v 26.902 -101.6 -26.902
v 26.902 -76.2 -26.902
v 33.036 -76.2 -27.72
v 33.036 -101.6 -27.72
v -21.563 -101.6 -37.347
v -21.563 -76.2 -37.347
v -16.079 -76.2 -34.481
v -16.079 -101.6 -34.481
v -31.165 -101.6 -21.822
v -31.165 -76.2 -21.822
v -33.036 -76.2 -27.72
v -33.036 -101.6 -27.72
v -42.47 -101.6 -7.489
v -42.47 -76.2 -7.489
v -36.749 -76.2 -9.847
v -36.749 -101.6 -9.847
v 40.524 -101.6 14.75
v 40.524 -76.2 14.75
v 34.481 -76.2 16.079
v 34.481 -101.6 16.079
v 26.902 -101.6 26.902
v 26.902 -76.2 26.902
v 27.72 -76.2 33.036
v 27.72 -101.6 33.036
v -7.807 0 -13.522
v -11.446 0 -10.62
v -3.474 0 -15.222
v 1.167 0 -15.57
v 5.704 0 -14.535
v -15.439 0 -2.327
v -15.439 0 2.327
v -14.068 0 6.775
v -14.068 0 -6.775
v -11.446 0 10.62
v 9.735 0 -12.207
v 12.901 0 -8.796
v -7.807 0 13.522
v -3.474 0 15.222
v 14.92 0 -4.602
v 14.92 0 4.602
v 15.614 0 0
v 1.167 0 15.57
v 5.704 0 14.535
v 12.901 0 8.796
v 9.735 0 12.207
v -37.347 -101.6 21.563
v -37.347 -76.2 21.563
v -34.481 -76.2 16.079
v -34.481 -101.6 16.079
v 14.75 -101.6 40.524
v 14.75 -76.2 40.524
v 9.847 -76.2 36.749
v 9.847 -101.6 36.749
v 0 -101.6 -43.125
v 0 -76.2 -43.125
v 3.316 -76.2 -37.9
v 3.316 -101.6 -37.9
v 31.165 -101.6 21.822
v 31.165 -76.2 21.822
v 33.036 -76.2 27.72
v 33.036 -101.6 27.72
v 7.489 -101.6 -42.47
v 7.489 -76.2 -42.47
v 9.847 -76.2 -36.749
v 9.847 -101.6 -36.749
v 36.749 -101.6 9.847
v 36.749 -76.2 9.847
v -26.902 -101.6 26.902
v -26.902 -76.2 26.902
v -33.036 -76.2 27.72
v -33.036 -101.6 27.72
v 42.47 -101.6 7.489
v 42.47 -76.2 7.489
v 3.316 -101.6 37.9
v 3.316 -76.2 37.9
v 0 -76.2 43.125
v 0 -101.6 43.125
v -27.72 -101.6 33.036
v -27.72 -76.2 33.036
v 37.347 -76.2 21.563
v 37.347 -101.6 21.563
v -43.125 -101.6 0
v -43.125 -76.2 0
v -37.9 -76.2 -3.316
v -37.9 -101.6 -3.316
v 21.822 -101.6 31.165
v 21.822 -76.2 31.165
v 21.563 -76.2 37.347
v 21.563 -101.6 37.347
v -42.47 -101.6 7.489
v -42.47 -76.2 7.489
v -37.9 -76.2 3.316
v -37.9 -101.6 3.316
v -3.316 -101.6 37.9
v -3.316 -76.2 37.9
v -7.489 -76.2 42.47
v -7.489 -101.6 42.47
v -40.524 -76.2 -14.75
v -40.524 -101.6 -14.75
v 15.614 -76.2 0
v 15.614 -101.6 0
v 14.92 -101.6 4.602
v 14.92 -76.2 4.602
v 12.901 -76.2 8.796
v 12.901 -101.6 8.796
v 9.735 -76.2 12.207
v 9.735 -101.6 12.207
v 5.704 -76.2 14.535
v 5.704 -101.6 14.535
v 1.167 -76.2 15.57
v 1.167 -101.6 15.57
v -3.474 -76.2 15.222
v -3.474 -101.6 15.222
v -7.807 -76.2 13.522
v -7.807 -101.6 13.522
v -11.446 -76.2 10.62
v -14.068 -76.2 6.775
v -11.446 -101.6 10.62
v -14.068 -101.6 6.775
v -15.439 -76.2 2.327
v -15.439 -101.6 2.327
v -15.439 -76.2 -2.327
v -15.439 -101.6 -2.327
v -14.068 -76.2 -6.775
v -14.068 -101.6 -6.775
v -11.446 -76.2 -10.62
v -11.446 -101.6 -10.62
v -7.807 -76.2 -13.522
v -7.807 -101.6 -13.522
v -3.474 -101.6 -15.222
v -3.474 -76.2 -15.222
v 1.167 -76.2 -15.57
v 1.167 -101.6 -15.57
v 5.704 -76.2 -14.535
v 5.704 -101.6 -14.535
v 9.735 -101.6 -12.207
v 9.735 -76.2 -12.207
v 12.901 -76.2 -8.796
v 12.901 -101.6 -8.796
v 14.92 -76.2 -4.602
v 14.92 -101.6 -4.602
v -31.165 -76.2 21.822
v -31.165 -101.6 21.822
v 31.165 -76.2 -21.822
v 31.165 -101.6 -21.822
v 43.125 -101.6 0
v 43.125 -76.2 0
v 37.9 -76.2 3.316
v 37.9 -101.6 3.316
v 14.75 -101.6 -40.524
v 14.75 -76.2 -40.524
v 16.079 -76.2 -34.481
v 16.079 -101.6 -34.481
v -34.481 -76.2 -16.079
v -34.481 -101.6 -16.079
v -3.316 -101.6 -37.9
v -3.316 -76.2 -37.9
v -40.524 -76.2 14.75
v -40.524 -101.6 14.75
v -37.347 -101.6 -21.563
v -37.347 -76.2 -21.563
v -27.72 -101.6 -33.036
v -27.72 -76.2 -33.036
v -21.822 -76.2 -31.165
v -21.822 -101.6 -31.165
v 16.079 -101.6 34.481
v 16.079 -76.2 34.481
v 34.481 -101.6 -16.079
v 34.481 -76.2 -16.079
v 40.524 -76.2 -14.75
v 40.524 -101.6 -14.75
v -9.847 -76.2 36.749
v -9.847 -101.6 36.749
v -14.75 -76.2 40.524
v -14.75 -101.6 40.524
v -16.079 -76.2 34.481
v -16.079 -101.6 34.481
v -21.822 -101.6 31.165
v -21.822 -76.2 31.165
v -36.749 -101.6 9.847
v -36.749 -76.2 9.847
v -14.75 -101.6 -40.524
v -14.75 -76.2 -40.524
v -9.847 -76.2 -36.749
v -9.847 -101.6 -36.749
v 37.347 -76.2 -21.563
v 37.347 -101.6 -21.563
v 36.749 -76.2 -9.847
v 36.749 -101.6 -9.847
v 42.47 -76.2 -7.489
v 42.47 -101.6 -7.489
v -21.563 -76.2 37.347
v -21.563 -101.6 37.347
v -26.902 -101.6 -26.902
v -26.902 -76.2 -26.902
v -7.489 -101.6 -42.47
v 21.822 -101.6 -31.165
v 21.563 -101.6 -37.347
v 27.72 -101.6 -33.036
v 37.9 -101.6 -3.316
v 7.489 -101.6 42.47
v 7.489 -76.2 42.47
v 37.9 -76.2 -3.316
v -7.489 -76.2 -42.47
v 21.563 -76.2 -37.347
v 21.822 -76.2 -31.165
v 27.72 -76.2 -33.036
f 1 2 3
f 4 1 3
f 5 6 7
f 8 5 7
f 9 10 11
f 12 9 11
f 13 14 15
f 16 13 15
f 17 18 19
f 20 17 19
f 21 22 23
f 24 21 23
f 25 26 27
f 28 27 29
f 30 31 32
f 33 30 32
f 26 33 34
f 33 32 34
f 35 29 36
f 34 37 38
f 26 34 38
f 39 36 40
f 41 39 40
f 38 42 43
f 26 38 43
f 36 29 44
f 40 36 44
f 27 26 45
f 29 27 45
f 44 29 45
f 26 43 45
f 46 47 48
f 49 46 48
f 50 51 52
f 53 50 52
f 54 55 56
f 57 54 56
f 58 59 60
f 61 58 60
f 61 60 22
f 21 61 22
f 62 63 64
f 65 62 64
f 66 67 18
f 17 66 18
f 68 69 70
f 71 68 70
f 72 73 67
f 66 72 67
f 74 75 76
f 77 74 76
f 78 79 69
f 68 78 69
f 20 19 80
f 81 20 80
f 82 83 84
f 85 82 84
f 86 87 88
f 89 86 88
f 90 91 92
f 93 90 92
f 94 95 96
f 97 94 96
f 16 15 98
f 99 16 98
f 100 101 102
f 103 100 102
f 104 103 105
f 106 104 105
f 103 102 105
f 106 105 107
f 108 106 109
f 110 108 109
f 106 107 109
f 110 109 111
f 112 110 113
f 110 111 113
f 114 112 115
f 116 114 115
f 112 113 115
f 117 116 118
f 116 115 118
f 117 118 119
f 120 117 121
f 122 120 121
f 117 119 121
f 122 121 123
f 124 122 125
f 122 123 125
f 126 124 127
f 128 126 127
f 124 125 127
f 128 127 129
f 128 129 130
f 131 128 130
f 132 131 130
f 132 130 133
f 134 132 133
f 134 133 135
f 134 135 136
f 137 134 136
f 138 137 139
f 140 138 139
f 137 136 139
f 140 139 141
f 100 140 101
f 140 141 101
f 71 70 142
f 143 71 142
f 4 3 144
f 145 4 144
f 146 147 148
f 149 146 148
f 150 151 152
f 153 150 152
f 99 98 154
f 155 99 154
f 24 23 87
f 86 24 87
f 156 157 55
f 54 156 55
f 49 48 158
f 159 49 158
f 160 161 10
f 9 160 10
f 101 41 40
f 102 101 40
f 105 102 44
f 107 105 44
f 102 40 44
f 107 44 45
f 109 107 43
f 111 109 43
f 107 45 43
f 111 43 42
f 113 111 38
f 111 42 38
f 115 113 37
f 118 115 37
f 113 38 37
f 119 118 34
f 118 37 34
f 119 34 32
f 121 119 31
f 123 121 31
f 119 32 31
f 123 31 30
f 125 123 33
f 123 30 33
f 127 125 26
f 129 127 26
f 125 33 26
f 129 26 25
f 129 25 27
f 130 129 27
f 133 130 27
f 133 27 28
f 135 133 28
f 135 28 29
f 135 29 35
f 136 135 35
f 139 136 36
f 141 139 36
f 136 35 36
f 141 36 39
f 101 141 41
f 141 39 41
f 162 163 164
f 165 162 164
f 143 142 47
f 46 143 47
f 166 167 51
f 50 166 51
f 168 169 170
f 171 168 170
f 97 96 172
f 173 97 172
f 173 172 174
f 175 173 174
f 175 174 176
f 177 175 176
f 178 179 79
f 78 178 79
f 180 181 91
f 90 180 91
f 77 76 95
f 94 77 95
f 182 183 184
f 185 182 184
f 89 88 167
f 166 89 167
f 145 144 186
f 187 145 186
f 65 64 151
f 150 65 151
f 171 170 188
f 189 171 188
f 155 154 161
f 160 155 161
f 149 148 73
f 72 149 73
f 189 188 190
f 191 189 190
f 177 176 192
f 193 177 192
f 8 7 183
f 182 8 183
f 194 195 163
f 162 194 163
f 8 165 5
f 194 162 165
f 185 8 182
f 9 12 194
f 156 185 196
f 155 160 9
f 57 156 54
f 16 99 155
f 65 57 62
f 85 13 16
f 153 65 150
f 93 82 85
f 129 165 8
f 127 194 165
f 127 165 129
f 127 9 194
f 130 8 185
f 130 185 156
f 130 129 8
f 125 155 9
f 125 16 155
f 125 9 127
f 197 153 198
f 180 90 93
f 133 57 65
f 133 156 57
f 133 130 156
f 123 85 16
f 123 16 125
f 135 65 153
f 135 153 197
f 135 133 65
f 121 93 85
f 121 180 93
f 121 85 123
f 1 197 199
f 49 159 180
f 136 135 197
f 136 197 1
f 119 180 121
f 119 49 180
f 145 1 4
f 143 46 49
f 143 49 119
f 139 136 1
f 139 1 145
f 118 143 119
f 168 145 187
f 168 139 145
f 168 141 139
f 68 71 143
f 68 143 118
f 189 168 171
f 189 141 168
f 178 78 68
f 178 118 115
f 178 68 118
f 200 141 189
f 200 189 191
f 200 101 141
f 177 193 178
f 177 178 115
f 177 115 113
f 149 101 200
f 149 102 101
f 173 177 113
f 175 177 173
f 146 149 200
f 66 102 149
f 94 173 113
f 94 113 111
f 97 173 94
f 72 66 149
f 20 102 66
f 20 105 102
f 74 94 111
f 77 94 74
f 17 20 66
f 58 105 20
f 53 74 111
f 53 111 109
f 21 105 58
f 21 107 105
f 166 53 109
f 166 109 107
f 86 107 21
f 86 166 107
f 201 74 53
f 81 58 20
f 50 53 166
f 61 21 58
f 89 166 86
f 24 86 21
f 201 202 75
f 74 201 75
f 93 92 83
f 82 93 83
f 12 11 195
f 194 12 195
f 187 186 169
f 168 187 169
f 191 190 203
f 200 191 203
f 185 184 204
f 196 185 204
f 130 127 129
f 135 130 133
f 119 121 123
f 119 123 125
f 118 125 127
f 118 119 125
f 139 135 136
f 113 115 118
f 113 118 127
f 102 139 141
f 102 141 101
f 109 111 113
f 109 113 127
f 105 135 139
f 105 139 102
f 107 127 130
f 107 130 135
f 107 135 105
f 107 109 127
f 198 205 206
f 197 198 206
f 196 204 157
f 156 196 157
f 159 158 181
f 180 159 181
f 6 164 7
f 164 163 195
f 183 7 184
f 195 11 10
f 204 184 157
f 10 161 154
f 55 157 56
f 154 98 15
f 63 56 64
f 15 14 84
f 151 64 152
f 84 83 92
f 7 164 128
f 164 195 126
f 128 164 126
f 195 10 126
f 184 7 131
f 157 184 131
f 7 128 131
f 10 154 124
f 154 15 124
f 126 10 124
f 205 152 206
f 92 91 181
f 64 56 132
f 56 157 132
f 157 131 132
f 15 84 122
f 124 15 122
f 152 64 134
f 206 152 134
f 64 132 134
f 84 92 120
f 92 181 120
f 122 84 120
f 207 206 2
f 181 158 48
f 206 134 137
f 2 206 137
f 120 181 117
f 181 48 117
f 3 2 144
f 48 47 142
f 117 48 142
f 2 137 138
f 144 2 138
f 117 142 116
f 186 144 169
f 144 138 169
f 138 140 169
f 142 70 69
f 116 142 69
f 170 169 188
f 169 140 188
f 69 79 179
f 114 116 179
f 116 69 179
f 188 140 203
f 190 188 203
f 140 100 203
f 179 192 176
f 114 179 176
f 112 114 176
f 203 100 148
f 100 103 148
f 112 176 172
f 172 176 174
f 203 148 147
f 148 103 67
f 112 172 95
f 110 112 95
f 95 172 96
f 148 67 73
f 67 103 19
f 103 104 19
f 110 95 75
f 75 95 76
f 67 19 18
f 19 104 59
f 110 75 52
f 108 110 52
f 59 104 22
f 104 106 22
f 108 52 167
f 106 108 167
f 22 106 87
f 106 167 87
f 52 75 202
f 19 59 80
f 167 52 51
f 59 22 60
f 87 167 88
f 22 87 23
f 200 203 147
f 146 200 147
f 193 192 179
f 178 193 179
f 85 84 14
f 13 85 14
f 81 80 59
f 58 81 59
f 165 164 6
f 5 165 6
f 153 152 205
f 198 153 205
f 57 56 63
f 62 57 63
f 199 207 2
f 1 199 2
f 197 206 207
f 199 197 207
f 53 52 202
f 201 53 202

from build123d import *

# Parameters (mm, degrees)
F0_R            = 15.6138441185
F1_DEPTH        = 101.6
F2_R            = 38.0450416099
F2_R_2          = 15.6138441185
F3_DEPTH        = 25.4
F5_DEPTH        = 25.4
F5_COPIES_COUNT = 36


# Not quite as in the source:
# - a pattern or mirror of a feature is missing from the dataset's text; its kind, count and spacing are read off the source's solid


with BuildPart() as f1:
    # F0 (on Front) → F1 (new body)
    with BuildSketch(Plane.XZ):
        Circle(F0_R)
    extrude(amount=F1_DEPTH)


with BuildPart() as f3:
    # F2 (on face) → F3 (new body)
    with BuildSketch(Plane.XZ.offset(101.6)):
        Circle(F2_R)
        Circle(F2_R_2, mode=Mode.SUBTRACT)
    extrude(amount=-F3_DEPTH)

    # F4 (on face) → F5 (join, through all)
    with BuildSketch(Plane.XZ.offset(101.6)):
        with BuildLine():
            Line((0, 43.1250416099), (-3.3158438594, 37.9002687404))
            ThreePointArc((-3.3158438594, 37.9002687404), (0, 38.0450416099), (3.3158438594, 37.9002687404))
            Line((3.3158438594, 37.9002687404), (0, 43.1250416099))
        make_face()
    f5 = extrude(amount=-F5_DEPTH)

    # F5_copies: F5 ×36 about axis
    f5_copies_axis = Axis((0, 0, 0), (0, 1, 0))
    for i in range(1, F5_COPIES_COUNT):
        add(f5.rotate(f5_copies_axis, i * 360 / F5_COPIES_COUNT))


solid = Compound([f1.part, f3.part])
